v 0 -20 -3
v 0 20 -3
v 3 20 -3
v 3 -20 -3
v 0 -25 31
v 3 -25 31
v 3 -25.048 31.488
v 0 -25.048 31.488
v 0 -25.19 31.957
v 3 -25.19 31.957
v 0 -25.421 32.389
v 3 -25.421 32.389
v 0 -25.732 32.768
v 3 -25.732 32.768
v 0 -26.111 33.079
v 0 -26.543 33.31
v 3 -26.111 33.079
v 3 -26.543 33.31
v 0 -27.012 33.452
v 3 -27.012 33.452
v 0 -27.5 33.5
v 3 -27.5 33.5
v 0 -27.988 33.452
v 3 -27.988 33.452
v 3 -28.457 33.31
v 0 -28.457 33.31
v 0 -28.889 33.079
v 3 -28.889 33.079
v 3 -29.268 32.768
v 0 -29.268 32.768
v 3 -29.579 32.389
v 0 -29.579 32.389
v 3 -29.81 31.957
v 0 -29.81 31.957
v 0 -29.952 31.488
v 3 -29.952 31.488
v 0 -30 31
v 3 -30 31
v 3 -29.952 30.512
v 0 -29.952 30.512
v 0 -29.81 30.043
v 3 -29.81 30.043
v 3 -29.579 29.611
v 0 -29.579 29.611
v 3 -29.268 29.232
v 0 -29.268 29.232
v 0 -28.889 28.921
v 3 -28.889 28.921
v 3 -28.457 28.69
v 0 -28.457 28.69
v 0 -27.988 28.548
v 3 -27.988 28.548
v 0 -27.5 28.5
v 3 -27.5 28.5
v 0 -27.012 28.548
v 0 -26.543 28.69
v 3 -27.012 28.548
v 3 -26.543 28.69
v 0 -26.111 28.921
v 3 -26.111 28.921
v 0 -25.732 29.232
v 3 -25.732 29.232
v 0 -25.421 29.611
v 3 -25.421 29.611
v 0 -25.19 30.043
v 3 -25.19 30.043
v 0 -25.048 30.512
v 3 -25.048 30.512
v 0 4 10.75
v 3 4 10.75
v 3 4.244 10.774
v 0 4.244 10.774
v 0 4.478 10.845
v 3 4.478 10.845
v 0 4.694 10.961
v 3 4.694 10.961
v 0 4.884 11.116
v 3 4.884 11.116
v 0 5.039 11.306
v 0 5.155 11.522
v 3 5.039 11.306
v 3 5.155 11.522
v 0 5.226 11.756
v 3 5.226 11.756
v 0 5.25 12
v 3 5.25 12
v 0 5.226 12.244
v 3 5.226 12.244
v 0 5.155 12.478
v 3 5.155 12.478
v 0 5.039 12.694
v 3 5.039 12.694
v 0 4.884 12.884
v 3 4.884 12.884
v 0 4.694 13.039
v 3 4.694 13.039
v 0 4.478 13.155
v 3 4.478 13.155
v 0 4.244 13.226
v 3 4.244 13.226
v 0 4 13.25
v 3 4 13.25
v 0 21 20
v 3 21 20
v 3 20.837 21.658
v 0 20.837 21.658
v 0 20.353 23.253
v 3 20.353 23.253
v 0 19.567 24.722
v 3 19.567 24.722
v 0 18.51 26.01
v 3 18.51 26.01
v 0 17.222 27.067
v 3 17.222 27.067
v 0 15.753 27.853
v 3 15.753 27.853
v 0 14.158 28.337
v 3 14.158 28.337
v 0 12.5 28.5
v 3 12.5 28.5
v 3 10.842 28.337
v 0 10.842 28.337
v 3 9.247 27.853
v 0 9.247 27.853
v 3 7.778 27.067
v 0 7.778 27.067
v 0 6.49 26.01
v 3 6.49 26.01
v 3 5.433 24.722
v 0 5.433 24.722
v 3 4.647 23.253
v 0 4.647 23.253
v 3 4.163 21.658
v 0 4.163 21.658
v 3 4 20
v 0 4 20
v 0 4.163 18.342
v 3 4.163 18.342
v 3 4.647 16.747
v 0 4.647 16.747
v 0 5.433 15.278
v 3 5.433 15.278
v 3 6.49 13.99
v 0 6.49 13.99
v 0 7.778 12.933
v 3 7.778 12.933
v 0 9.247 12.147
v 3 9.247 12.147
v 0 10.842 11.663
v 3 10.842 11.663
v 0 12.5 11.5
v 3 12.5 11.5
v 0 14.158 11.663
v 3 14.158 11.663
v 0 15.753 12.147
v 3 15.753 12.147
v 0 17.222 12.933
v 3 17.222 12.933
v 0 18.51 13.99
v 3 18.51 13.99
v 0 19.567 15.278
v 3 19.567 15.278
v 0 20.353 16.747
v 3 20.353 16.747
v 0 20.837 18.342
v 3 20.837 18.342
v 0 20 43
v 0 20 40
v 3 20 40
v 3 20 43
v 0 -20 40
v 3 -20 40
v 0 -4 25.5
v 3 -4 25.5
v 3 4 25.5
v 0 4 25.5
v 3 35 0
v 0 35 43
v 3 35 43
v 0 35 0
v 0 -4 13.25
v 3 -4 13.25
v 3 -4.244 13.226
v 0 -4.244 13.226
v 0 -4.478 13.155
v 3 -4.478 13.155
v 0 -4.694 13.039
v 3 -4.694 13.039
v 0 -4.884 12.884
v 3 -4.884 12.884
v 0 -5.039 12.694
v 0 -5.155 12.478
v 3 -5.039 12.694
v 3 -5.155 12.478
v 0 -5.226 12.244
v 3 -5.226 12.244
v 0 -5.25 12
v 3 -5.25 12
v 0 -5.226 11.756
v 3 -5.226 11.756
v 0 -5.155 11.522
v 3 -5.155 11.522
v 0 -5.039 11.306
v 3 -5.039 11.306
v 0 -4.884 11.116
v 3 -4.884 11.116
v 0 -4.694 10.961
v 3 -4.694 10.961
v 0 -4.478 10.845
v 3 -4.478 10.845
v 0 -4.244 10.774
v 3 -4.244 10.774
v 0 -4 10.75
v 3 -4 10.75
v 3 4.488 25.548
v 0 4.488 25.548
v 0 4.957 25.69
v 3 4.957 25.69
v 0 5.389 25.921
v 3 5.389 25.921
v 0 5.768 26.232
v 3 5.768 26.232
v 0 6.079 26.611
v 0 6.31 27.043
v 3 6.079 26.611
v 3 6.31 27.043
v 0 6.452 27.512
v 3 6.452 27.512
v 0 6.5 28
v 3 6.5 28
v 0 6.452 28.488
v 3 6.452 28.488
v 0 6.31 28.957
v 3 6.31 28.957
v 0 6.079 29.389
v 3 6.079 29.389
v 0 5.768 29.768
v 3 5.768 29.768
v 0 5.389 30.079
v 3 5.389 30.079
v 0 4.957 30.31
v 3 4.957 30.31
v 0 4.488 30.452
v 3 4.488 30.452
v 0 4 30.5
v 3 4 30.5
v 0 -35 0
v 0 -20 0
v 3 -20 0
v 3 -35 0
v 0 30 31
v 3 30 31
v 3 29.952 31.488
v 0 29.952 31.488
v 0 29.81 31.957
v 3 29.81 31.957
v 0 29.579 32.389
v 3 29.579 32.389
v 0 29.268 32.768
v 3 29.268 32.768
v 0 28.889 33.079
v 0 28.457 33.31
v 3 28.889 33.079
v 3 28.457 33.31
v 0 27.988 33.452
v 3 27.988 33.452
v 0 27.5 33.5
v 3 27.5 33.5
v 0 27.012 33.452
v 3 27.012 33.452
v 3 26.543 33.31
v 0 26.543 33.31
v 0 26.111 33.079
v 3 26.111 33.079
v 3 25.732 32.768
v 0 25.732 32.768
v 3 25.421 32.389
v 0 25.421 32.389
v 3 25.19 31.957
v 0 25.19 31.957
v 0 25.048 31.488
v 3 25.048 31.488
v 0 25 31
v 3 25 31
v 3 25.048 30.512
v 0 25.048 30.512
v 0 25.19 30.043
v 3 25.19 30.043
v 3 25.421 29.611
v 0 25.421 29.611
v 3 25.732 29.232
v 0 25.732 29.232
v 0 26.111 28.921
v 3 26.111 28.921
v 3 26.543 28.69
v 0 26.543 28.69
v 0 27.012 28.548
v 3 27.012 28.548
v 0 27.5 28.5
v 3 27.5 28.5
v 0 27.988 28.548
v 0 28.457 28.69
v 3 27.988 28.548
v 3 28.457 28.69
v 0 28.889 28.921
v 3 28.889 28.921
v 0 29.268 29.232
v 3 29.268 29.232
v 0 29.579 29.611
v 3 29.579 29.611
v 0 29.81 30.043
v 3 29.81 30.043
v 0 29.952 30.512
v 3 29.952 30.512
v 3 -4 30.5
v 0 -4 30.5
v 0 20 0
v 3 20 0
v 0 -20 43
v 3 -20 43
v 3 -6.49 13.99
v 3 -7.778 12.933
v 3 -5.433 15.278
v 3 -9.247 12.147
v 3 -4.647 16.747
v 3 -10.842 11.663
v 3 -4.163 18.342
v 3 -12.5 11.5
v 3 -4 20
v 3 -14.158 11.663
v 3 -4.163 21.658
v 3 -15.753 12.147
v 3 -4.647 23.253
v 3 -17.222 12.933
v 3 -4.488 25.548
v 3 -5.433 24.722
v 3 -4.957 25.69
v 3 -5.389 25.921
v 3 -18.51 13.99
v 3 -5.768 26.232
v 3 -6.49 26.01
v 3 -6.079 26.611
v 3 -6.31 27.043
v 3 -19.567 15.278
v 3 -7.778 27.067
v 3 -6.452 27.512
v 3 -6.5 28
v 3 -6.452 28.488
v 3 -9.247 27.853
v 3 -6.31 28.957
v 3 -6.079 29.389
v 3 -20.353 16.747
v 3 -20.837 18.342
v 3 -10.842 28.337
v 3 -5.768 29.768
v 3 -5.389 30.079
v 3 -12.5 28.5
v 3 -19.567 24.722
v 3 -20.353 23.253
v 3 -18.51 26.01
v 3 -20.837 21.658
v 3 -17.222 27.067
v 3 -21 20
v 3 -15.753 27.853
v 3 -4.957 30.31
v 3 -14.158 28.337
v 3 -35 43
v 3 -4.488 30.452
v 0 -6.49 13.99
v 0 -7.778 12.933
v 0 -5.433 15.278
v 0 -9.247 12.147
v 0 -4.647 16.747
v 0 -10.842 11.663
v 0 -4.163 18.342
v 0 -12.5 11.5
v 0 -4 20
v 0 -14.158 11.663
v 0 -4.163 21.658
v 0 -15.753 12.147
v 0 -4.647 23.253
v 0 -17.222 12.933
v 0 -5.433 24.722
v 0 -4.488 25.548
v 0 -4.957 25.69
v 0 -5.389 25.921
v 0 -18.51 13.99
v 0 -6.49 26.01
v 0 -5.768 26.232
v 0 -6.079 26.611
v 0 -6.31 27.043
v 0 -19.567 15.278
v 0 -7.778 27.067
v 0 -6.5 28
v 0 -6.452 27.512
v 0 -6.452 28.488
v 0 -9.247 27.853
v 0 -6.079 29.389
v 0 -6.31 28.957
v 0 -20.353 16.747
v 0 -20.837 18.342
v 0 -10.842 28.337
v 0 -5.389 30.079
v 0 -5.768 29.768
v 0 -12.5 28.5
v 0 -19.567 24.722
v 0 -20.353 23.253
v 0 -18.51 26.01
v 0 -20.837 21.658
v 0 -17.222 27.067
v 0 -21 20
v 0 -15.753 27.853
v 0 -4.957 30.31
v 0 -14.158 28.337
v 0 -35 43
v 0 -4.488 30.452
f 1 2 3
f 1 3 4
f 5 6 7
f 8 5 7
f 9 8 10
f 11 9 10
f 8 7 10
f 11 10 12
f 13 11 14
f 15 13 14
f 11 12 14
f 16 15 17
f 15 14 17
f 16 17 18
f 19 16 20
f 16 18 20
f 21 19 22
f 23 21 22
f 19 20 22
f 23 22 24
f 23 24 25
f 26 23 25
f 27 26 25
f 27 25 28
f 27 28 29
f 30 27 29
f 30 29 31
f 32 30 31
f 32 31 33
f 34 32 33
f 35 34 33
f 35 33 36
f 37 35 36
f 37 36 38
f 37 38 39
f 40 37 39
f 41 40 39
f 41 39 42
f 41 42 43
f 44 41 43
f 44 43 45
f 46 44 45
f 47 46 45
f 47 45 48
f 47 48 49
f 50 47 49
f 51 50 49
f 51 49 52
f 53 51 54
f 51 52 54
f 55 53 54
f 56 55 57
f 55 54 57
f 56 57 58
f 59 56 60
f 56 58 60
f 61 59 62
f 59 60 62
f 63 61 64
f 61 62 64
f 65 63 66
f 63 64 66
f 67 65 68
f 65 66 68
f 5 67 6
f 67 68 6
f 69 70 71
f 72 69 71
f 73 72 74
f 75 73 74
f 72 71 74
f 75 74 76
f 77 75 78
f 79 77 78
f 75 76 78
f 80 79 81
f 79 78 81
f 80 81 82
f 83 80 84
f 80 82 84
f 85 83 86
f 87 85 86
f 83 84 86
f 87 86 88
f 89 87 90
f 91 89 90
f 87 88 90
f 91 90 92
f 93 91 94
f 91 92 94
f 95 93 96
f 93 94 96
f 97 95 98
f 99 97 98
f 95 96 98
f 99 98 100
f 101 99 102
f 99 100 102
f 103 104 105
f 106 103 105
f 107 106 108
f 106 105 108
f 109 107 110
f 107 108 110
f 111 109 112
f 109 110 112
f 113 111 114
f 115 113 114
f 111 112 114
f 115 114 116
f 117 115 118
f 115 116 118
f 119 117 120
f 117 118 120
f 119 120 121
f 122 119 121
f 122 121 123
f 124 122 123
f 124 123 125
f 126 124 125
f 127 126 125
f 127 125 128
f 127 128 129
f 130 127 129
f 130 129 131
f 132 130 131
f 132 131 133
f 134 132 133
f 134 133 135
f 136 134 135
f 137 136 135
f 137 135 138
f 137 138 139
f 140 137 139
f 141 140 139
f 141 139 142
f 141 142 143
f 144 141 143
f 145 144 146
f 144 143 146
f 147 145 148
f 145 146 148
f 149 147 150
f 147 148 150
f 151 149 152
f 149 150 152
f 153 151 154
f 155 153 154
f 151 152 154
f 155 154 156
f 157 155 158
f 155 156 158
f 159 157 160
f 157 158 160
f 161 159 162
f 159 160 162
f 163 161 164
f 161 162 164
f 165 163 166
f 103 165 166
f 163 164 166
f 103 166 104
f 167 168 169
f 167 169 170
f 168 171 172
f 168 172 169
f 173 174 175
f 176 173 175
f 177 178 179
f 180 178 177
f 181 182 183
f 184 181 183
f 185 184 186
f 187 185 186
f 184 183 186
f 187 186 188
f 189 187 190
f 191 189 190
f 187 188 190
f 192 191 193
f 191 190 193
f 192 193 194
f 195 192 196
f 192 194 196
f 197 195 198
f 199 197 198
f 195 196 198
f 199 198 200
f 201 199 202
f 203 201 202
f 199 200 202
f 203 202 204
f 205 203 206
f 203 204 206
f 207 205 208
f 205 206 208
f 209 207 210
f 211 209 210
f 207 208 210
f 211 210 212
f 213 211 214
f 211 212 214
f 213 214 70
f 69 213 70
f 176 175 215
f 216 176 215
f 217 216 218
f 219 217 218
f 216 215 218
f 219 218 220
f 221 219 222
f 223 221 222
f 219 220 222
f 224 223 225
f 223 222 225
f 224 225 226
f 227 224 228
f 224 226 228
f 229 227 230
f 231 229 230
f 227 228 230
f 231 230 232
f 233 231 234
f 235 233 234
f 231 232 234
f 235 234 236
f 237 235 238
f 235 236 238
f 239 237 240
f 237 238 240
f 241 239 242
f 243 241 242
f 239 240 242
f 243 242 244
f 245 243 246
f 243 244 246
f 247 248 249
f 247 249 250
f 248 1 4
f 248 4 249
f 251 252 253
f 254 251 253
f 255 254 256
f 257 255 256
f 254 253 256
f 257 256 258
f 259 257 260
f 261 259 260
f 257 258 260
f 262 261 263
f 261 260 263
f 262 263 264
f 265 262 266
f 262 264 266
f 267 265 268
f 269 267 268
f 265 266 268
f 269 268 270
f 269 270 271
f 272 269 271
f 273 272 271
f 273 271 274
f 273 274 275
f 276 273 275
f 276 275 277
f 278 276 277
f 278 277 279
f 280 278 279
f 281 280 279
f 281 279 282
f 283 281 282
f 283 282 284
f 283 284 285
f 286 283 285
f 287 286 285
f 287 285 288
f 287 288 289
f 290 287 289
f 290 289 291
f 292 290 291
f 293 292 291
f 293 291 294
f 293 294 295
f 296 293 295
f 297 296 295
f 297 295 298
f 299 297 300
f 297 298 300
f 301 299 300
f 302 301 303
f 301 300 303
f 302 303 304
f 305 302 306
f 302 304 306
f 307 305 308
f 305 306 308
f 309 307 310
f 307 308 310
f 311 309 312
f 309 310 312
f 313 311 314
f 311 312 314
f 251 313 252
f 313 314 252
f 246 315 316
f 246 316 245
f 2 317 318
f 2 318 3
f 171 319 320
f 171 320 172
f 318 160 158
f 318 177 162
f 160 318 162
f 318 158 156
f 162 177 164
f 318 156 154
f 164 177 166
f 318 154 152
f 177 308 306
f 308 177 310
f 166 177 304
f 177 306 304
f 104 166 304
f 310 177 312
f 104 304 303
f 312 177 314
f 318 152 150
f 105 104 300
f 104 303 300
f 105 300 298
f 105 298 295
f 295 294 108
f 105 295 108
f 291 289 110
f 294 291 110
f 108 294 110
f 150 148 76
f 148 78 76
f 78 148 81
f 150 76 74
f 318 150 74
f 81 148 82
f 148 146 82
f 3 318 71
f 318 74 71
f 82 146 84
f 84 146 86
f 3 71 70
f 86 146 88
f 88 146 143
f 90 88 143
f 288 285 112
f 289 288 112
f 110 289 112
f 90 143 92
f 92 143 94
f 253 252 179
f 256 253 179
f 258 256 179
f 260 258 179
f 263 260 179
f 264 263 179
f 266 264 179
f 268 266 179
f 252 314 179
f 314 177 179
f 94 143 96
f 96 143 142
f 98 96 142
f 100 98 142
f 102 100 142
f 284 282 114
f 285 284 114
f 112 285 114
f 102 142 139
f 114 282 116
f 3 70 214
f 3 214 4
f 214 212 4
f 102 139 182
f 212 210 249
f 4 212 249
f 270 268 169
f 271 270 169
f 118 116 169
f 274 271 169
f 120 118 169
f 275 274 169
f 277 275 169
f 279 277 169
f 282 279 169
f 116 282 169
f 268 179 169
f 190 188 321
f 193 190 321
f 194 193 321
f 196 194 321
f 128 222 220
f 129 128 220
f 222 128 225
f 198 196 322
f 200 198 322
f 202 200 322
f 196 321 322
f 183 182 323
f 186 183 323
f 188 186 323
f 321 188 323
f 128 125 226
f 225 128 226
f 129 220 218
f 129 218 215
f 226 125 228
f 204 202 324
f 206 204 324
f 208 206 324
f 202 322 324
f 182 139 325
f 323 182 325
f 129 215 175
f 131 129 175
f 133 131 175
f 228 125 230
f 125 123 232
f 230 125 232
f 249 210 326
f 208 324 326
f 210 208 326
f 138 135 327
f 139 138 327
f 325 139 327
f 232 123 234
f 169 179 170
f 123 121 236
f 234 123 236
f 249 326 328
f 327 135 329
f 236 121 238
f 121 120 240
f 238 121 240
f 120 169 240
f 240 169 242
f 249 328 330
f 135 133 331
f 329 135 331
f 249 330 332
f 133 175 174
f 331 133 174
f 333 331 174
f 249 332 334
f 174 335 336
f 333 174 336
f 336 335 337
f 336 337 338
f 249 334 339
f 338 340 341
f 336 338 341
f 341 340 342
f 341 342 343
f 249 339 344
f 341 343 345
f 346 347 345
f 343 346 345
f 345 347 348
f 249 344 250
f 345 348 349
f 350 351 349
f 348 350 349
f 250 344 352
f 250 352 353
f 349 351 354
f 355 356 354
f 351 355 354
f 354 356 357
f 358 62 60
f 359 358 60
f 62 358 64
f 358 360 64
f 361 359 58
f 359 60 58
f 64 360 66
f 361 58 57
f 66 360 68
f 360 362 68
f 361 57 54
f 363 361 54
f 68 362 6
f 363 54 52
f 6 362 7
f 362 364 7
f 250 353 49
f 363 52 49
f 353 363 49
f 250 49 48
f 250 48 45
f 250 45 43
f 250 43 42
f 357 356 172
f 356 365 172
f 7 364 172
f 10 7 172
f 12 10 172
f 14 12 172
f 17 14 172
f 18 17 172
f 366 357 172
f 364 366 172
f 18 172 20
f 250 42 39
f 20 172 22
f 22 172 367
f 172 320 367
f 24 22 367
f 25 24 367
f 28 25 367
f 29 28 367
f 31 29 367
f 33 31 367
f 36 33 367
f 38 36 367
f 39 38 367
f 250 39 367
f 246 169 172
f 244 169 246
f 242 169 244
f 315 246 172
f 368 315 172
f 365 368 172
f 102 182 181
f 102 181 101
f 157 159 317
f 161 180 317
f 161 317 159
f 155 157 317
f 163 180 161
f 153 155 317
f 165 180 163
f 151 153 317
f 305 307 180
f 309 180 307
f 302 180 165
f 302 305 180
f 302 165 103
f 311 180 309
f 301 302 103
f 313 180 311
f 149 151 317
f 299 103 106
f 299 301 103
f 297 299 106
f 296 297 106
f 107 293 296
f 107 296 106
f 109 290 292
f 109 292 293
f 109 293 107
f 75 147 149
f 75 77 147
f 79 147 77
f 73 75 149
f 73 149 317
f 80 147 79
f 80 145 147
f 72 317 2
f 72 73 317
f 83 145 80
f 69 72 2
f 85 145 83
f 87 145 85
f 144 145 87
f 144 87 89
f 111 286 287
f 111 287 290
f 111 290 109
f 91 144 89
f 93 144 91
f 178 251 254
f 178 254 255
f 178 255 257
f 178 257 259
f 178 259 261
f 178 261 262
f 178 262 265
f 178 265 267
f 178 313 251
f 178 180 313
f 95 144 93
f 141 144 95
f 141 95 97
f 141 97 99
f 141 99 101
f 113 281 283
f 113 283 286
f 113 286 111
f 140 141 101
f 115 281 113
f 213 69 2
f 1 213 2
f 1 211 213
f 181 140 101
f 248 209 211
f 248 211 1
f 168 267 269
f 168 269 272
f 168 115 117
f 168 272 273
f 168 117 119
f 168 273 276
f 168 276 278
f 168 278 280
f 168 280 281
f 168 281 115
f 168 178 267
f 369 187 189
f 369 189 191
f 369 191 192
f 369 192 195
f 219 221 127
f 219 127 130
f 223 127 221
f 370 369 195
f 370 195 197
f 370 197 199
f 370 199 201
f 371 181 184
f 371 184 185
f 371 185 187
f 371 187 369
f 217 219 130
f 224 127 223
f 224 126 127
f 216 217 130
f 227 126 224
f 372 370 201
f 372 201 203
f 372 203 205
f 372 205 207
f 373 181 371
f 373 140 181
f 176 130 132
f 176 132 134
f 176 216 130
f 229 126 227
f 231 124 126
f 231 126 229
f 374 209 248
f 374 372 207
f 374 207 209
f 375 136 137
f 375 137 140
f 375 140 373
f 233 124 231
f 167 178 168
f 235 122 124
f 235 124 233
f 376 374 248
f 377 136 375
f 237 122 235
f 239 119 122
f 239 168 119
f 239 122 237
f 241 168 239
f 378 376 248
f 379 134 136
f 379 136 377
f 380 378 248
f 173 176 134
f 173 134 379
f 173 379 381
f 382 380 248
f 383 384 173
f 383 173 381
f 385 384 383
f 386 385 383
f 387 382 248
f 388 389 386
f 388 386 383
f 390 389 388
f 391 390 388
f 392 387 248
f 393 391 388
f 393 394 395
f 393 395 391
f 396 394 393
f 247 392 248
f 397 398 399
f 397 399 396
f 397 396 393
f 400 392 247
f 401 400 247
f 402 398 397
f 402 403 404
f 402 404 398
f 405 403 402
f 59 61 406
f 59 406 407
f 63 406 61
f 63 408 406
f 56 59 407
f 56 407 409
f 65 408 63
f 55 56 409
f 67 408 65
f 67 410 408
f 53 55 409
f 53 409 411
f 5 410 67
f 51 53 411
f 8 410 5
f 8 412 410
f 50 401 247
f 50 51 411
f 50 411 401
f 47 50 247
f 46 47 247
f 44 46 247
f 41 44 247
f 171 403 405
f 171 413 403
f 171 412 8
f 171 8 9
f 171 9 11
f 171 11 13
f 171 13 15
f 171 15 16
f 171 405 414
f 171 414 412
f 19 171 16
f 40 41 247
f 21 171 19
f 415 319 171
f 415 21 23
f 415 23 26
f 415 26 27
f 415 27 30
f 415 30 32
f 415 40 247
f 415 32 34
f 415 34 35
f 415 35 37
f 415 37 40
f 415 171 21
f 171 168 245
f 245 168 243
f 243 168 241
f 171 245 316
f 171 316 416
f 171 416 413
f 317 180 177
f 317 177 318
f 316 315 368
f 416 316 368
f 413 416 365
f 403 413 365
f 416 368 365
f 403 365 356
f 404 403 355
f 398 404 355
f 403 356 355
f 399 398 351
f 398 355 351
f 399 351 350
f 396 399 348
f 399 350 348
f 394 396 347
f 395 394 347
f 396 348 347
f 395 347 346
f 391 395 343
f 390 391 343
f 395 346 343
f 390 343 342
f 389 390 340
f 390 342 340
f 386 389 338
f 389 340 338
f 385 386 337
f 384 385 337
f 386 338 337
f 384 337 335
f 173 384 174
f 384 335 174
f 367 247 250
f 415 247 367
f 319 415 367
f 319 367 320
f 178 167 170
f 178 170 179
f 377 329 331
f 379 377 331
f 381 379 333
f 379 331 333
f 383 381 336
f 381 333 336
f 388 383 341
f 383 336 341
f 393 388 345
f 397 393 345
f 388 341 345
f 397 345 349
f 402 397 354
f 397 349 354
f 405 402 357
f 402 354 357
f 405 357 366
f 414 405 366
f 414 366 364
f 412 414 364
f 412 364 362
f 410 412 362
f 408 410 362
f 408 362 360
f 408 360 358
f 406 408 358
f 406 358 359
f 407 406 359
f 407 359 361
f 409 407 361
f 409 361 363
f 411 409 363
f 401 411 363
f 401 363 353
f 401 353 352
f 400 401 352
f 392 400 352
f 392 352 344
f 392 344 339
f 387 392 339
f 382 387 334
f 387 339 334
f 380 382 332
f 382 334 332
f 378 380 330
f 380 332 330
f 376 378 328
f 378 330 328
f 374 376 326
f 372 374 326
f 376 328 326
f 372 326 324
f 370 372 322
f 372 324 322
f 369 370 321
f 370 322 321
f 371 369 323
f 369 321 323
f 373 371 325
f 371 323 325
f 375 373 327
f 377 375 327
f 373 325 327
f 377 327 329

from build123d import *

# Parameters (mm, degrees)
PAD002_DEPTH    = 3
SKETCH008_R     = 8.5
POCKET005_DEPTH = 3.001
SKETCH009_R     = 2.5
POCKET006_DEPTH = 3.001


with BuildPart() as part:
    # Sketch007 → Pad002 (new body)
    with BuildSketch(Plane.YZ):
        Polygon((-35, 43), (-20, 43), (-20, 40), (20, 40), (20, 43), (35, 43), (35, 0), (20, 0), (20, -3), (-20, -3), (-20, 0), (-35, 0), align=None)
    extrude(amount=PAD002_DEPTH)

    # Sketch008 → Pocket005 (cut, through all)
    with BuildSketch(Plane.YZ.offset(3)):
        with Locations((-12.5, 20)):
            Circle(SKETCH008_R)
        with Locations((12.5, 20)):
            Circle(SKETCH008_R)
        with BuildLine():
            Line((-4, 30.5), (4, 30.5))
            ThreePointArc((4, 25.5), (6.5, 28), (4, 30.5))
            Line((-4, 25.5), (4, 25.5))
            ThreePointArc((-4, 30.5), (-6.5, 28), (-4, 25.5))
        make_face()
        with BuildLine():
            Line((-4, 13.25), (4, 13.25))
            ThreePointArc((4, 10.75), (5.25, 12), (4, 13.25))
            Line((-4, 10.75), (4, 10.75))
            ThreePointArc((-4, 13.25), (-5.25, 12), (-4, 10.75))
        make_face()
    extrude(amount=-POCKET005_DEPTH, mode=Mode.SUBTRACT)

    # Sketch009 → Pocket006 (cut, through all)
    with BuildSketch(Plane.YZ.offset(3)):
        with Locations((-27.5, 31)):
            Circle(SKETCH009_R)
        with Locations((27.5, 31)):
            Circle(SKETCH009_R)
    extrude(amount=-POCKET006_DEPTH, mode=Mode.SUBTRACT)


solid = part.part
